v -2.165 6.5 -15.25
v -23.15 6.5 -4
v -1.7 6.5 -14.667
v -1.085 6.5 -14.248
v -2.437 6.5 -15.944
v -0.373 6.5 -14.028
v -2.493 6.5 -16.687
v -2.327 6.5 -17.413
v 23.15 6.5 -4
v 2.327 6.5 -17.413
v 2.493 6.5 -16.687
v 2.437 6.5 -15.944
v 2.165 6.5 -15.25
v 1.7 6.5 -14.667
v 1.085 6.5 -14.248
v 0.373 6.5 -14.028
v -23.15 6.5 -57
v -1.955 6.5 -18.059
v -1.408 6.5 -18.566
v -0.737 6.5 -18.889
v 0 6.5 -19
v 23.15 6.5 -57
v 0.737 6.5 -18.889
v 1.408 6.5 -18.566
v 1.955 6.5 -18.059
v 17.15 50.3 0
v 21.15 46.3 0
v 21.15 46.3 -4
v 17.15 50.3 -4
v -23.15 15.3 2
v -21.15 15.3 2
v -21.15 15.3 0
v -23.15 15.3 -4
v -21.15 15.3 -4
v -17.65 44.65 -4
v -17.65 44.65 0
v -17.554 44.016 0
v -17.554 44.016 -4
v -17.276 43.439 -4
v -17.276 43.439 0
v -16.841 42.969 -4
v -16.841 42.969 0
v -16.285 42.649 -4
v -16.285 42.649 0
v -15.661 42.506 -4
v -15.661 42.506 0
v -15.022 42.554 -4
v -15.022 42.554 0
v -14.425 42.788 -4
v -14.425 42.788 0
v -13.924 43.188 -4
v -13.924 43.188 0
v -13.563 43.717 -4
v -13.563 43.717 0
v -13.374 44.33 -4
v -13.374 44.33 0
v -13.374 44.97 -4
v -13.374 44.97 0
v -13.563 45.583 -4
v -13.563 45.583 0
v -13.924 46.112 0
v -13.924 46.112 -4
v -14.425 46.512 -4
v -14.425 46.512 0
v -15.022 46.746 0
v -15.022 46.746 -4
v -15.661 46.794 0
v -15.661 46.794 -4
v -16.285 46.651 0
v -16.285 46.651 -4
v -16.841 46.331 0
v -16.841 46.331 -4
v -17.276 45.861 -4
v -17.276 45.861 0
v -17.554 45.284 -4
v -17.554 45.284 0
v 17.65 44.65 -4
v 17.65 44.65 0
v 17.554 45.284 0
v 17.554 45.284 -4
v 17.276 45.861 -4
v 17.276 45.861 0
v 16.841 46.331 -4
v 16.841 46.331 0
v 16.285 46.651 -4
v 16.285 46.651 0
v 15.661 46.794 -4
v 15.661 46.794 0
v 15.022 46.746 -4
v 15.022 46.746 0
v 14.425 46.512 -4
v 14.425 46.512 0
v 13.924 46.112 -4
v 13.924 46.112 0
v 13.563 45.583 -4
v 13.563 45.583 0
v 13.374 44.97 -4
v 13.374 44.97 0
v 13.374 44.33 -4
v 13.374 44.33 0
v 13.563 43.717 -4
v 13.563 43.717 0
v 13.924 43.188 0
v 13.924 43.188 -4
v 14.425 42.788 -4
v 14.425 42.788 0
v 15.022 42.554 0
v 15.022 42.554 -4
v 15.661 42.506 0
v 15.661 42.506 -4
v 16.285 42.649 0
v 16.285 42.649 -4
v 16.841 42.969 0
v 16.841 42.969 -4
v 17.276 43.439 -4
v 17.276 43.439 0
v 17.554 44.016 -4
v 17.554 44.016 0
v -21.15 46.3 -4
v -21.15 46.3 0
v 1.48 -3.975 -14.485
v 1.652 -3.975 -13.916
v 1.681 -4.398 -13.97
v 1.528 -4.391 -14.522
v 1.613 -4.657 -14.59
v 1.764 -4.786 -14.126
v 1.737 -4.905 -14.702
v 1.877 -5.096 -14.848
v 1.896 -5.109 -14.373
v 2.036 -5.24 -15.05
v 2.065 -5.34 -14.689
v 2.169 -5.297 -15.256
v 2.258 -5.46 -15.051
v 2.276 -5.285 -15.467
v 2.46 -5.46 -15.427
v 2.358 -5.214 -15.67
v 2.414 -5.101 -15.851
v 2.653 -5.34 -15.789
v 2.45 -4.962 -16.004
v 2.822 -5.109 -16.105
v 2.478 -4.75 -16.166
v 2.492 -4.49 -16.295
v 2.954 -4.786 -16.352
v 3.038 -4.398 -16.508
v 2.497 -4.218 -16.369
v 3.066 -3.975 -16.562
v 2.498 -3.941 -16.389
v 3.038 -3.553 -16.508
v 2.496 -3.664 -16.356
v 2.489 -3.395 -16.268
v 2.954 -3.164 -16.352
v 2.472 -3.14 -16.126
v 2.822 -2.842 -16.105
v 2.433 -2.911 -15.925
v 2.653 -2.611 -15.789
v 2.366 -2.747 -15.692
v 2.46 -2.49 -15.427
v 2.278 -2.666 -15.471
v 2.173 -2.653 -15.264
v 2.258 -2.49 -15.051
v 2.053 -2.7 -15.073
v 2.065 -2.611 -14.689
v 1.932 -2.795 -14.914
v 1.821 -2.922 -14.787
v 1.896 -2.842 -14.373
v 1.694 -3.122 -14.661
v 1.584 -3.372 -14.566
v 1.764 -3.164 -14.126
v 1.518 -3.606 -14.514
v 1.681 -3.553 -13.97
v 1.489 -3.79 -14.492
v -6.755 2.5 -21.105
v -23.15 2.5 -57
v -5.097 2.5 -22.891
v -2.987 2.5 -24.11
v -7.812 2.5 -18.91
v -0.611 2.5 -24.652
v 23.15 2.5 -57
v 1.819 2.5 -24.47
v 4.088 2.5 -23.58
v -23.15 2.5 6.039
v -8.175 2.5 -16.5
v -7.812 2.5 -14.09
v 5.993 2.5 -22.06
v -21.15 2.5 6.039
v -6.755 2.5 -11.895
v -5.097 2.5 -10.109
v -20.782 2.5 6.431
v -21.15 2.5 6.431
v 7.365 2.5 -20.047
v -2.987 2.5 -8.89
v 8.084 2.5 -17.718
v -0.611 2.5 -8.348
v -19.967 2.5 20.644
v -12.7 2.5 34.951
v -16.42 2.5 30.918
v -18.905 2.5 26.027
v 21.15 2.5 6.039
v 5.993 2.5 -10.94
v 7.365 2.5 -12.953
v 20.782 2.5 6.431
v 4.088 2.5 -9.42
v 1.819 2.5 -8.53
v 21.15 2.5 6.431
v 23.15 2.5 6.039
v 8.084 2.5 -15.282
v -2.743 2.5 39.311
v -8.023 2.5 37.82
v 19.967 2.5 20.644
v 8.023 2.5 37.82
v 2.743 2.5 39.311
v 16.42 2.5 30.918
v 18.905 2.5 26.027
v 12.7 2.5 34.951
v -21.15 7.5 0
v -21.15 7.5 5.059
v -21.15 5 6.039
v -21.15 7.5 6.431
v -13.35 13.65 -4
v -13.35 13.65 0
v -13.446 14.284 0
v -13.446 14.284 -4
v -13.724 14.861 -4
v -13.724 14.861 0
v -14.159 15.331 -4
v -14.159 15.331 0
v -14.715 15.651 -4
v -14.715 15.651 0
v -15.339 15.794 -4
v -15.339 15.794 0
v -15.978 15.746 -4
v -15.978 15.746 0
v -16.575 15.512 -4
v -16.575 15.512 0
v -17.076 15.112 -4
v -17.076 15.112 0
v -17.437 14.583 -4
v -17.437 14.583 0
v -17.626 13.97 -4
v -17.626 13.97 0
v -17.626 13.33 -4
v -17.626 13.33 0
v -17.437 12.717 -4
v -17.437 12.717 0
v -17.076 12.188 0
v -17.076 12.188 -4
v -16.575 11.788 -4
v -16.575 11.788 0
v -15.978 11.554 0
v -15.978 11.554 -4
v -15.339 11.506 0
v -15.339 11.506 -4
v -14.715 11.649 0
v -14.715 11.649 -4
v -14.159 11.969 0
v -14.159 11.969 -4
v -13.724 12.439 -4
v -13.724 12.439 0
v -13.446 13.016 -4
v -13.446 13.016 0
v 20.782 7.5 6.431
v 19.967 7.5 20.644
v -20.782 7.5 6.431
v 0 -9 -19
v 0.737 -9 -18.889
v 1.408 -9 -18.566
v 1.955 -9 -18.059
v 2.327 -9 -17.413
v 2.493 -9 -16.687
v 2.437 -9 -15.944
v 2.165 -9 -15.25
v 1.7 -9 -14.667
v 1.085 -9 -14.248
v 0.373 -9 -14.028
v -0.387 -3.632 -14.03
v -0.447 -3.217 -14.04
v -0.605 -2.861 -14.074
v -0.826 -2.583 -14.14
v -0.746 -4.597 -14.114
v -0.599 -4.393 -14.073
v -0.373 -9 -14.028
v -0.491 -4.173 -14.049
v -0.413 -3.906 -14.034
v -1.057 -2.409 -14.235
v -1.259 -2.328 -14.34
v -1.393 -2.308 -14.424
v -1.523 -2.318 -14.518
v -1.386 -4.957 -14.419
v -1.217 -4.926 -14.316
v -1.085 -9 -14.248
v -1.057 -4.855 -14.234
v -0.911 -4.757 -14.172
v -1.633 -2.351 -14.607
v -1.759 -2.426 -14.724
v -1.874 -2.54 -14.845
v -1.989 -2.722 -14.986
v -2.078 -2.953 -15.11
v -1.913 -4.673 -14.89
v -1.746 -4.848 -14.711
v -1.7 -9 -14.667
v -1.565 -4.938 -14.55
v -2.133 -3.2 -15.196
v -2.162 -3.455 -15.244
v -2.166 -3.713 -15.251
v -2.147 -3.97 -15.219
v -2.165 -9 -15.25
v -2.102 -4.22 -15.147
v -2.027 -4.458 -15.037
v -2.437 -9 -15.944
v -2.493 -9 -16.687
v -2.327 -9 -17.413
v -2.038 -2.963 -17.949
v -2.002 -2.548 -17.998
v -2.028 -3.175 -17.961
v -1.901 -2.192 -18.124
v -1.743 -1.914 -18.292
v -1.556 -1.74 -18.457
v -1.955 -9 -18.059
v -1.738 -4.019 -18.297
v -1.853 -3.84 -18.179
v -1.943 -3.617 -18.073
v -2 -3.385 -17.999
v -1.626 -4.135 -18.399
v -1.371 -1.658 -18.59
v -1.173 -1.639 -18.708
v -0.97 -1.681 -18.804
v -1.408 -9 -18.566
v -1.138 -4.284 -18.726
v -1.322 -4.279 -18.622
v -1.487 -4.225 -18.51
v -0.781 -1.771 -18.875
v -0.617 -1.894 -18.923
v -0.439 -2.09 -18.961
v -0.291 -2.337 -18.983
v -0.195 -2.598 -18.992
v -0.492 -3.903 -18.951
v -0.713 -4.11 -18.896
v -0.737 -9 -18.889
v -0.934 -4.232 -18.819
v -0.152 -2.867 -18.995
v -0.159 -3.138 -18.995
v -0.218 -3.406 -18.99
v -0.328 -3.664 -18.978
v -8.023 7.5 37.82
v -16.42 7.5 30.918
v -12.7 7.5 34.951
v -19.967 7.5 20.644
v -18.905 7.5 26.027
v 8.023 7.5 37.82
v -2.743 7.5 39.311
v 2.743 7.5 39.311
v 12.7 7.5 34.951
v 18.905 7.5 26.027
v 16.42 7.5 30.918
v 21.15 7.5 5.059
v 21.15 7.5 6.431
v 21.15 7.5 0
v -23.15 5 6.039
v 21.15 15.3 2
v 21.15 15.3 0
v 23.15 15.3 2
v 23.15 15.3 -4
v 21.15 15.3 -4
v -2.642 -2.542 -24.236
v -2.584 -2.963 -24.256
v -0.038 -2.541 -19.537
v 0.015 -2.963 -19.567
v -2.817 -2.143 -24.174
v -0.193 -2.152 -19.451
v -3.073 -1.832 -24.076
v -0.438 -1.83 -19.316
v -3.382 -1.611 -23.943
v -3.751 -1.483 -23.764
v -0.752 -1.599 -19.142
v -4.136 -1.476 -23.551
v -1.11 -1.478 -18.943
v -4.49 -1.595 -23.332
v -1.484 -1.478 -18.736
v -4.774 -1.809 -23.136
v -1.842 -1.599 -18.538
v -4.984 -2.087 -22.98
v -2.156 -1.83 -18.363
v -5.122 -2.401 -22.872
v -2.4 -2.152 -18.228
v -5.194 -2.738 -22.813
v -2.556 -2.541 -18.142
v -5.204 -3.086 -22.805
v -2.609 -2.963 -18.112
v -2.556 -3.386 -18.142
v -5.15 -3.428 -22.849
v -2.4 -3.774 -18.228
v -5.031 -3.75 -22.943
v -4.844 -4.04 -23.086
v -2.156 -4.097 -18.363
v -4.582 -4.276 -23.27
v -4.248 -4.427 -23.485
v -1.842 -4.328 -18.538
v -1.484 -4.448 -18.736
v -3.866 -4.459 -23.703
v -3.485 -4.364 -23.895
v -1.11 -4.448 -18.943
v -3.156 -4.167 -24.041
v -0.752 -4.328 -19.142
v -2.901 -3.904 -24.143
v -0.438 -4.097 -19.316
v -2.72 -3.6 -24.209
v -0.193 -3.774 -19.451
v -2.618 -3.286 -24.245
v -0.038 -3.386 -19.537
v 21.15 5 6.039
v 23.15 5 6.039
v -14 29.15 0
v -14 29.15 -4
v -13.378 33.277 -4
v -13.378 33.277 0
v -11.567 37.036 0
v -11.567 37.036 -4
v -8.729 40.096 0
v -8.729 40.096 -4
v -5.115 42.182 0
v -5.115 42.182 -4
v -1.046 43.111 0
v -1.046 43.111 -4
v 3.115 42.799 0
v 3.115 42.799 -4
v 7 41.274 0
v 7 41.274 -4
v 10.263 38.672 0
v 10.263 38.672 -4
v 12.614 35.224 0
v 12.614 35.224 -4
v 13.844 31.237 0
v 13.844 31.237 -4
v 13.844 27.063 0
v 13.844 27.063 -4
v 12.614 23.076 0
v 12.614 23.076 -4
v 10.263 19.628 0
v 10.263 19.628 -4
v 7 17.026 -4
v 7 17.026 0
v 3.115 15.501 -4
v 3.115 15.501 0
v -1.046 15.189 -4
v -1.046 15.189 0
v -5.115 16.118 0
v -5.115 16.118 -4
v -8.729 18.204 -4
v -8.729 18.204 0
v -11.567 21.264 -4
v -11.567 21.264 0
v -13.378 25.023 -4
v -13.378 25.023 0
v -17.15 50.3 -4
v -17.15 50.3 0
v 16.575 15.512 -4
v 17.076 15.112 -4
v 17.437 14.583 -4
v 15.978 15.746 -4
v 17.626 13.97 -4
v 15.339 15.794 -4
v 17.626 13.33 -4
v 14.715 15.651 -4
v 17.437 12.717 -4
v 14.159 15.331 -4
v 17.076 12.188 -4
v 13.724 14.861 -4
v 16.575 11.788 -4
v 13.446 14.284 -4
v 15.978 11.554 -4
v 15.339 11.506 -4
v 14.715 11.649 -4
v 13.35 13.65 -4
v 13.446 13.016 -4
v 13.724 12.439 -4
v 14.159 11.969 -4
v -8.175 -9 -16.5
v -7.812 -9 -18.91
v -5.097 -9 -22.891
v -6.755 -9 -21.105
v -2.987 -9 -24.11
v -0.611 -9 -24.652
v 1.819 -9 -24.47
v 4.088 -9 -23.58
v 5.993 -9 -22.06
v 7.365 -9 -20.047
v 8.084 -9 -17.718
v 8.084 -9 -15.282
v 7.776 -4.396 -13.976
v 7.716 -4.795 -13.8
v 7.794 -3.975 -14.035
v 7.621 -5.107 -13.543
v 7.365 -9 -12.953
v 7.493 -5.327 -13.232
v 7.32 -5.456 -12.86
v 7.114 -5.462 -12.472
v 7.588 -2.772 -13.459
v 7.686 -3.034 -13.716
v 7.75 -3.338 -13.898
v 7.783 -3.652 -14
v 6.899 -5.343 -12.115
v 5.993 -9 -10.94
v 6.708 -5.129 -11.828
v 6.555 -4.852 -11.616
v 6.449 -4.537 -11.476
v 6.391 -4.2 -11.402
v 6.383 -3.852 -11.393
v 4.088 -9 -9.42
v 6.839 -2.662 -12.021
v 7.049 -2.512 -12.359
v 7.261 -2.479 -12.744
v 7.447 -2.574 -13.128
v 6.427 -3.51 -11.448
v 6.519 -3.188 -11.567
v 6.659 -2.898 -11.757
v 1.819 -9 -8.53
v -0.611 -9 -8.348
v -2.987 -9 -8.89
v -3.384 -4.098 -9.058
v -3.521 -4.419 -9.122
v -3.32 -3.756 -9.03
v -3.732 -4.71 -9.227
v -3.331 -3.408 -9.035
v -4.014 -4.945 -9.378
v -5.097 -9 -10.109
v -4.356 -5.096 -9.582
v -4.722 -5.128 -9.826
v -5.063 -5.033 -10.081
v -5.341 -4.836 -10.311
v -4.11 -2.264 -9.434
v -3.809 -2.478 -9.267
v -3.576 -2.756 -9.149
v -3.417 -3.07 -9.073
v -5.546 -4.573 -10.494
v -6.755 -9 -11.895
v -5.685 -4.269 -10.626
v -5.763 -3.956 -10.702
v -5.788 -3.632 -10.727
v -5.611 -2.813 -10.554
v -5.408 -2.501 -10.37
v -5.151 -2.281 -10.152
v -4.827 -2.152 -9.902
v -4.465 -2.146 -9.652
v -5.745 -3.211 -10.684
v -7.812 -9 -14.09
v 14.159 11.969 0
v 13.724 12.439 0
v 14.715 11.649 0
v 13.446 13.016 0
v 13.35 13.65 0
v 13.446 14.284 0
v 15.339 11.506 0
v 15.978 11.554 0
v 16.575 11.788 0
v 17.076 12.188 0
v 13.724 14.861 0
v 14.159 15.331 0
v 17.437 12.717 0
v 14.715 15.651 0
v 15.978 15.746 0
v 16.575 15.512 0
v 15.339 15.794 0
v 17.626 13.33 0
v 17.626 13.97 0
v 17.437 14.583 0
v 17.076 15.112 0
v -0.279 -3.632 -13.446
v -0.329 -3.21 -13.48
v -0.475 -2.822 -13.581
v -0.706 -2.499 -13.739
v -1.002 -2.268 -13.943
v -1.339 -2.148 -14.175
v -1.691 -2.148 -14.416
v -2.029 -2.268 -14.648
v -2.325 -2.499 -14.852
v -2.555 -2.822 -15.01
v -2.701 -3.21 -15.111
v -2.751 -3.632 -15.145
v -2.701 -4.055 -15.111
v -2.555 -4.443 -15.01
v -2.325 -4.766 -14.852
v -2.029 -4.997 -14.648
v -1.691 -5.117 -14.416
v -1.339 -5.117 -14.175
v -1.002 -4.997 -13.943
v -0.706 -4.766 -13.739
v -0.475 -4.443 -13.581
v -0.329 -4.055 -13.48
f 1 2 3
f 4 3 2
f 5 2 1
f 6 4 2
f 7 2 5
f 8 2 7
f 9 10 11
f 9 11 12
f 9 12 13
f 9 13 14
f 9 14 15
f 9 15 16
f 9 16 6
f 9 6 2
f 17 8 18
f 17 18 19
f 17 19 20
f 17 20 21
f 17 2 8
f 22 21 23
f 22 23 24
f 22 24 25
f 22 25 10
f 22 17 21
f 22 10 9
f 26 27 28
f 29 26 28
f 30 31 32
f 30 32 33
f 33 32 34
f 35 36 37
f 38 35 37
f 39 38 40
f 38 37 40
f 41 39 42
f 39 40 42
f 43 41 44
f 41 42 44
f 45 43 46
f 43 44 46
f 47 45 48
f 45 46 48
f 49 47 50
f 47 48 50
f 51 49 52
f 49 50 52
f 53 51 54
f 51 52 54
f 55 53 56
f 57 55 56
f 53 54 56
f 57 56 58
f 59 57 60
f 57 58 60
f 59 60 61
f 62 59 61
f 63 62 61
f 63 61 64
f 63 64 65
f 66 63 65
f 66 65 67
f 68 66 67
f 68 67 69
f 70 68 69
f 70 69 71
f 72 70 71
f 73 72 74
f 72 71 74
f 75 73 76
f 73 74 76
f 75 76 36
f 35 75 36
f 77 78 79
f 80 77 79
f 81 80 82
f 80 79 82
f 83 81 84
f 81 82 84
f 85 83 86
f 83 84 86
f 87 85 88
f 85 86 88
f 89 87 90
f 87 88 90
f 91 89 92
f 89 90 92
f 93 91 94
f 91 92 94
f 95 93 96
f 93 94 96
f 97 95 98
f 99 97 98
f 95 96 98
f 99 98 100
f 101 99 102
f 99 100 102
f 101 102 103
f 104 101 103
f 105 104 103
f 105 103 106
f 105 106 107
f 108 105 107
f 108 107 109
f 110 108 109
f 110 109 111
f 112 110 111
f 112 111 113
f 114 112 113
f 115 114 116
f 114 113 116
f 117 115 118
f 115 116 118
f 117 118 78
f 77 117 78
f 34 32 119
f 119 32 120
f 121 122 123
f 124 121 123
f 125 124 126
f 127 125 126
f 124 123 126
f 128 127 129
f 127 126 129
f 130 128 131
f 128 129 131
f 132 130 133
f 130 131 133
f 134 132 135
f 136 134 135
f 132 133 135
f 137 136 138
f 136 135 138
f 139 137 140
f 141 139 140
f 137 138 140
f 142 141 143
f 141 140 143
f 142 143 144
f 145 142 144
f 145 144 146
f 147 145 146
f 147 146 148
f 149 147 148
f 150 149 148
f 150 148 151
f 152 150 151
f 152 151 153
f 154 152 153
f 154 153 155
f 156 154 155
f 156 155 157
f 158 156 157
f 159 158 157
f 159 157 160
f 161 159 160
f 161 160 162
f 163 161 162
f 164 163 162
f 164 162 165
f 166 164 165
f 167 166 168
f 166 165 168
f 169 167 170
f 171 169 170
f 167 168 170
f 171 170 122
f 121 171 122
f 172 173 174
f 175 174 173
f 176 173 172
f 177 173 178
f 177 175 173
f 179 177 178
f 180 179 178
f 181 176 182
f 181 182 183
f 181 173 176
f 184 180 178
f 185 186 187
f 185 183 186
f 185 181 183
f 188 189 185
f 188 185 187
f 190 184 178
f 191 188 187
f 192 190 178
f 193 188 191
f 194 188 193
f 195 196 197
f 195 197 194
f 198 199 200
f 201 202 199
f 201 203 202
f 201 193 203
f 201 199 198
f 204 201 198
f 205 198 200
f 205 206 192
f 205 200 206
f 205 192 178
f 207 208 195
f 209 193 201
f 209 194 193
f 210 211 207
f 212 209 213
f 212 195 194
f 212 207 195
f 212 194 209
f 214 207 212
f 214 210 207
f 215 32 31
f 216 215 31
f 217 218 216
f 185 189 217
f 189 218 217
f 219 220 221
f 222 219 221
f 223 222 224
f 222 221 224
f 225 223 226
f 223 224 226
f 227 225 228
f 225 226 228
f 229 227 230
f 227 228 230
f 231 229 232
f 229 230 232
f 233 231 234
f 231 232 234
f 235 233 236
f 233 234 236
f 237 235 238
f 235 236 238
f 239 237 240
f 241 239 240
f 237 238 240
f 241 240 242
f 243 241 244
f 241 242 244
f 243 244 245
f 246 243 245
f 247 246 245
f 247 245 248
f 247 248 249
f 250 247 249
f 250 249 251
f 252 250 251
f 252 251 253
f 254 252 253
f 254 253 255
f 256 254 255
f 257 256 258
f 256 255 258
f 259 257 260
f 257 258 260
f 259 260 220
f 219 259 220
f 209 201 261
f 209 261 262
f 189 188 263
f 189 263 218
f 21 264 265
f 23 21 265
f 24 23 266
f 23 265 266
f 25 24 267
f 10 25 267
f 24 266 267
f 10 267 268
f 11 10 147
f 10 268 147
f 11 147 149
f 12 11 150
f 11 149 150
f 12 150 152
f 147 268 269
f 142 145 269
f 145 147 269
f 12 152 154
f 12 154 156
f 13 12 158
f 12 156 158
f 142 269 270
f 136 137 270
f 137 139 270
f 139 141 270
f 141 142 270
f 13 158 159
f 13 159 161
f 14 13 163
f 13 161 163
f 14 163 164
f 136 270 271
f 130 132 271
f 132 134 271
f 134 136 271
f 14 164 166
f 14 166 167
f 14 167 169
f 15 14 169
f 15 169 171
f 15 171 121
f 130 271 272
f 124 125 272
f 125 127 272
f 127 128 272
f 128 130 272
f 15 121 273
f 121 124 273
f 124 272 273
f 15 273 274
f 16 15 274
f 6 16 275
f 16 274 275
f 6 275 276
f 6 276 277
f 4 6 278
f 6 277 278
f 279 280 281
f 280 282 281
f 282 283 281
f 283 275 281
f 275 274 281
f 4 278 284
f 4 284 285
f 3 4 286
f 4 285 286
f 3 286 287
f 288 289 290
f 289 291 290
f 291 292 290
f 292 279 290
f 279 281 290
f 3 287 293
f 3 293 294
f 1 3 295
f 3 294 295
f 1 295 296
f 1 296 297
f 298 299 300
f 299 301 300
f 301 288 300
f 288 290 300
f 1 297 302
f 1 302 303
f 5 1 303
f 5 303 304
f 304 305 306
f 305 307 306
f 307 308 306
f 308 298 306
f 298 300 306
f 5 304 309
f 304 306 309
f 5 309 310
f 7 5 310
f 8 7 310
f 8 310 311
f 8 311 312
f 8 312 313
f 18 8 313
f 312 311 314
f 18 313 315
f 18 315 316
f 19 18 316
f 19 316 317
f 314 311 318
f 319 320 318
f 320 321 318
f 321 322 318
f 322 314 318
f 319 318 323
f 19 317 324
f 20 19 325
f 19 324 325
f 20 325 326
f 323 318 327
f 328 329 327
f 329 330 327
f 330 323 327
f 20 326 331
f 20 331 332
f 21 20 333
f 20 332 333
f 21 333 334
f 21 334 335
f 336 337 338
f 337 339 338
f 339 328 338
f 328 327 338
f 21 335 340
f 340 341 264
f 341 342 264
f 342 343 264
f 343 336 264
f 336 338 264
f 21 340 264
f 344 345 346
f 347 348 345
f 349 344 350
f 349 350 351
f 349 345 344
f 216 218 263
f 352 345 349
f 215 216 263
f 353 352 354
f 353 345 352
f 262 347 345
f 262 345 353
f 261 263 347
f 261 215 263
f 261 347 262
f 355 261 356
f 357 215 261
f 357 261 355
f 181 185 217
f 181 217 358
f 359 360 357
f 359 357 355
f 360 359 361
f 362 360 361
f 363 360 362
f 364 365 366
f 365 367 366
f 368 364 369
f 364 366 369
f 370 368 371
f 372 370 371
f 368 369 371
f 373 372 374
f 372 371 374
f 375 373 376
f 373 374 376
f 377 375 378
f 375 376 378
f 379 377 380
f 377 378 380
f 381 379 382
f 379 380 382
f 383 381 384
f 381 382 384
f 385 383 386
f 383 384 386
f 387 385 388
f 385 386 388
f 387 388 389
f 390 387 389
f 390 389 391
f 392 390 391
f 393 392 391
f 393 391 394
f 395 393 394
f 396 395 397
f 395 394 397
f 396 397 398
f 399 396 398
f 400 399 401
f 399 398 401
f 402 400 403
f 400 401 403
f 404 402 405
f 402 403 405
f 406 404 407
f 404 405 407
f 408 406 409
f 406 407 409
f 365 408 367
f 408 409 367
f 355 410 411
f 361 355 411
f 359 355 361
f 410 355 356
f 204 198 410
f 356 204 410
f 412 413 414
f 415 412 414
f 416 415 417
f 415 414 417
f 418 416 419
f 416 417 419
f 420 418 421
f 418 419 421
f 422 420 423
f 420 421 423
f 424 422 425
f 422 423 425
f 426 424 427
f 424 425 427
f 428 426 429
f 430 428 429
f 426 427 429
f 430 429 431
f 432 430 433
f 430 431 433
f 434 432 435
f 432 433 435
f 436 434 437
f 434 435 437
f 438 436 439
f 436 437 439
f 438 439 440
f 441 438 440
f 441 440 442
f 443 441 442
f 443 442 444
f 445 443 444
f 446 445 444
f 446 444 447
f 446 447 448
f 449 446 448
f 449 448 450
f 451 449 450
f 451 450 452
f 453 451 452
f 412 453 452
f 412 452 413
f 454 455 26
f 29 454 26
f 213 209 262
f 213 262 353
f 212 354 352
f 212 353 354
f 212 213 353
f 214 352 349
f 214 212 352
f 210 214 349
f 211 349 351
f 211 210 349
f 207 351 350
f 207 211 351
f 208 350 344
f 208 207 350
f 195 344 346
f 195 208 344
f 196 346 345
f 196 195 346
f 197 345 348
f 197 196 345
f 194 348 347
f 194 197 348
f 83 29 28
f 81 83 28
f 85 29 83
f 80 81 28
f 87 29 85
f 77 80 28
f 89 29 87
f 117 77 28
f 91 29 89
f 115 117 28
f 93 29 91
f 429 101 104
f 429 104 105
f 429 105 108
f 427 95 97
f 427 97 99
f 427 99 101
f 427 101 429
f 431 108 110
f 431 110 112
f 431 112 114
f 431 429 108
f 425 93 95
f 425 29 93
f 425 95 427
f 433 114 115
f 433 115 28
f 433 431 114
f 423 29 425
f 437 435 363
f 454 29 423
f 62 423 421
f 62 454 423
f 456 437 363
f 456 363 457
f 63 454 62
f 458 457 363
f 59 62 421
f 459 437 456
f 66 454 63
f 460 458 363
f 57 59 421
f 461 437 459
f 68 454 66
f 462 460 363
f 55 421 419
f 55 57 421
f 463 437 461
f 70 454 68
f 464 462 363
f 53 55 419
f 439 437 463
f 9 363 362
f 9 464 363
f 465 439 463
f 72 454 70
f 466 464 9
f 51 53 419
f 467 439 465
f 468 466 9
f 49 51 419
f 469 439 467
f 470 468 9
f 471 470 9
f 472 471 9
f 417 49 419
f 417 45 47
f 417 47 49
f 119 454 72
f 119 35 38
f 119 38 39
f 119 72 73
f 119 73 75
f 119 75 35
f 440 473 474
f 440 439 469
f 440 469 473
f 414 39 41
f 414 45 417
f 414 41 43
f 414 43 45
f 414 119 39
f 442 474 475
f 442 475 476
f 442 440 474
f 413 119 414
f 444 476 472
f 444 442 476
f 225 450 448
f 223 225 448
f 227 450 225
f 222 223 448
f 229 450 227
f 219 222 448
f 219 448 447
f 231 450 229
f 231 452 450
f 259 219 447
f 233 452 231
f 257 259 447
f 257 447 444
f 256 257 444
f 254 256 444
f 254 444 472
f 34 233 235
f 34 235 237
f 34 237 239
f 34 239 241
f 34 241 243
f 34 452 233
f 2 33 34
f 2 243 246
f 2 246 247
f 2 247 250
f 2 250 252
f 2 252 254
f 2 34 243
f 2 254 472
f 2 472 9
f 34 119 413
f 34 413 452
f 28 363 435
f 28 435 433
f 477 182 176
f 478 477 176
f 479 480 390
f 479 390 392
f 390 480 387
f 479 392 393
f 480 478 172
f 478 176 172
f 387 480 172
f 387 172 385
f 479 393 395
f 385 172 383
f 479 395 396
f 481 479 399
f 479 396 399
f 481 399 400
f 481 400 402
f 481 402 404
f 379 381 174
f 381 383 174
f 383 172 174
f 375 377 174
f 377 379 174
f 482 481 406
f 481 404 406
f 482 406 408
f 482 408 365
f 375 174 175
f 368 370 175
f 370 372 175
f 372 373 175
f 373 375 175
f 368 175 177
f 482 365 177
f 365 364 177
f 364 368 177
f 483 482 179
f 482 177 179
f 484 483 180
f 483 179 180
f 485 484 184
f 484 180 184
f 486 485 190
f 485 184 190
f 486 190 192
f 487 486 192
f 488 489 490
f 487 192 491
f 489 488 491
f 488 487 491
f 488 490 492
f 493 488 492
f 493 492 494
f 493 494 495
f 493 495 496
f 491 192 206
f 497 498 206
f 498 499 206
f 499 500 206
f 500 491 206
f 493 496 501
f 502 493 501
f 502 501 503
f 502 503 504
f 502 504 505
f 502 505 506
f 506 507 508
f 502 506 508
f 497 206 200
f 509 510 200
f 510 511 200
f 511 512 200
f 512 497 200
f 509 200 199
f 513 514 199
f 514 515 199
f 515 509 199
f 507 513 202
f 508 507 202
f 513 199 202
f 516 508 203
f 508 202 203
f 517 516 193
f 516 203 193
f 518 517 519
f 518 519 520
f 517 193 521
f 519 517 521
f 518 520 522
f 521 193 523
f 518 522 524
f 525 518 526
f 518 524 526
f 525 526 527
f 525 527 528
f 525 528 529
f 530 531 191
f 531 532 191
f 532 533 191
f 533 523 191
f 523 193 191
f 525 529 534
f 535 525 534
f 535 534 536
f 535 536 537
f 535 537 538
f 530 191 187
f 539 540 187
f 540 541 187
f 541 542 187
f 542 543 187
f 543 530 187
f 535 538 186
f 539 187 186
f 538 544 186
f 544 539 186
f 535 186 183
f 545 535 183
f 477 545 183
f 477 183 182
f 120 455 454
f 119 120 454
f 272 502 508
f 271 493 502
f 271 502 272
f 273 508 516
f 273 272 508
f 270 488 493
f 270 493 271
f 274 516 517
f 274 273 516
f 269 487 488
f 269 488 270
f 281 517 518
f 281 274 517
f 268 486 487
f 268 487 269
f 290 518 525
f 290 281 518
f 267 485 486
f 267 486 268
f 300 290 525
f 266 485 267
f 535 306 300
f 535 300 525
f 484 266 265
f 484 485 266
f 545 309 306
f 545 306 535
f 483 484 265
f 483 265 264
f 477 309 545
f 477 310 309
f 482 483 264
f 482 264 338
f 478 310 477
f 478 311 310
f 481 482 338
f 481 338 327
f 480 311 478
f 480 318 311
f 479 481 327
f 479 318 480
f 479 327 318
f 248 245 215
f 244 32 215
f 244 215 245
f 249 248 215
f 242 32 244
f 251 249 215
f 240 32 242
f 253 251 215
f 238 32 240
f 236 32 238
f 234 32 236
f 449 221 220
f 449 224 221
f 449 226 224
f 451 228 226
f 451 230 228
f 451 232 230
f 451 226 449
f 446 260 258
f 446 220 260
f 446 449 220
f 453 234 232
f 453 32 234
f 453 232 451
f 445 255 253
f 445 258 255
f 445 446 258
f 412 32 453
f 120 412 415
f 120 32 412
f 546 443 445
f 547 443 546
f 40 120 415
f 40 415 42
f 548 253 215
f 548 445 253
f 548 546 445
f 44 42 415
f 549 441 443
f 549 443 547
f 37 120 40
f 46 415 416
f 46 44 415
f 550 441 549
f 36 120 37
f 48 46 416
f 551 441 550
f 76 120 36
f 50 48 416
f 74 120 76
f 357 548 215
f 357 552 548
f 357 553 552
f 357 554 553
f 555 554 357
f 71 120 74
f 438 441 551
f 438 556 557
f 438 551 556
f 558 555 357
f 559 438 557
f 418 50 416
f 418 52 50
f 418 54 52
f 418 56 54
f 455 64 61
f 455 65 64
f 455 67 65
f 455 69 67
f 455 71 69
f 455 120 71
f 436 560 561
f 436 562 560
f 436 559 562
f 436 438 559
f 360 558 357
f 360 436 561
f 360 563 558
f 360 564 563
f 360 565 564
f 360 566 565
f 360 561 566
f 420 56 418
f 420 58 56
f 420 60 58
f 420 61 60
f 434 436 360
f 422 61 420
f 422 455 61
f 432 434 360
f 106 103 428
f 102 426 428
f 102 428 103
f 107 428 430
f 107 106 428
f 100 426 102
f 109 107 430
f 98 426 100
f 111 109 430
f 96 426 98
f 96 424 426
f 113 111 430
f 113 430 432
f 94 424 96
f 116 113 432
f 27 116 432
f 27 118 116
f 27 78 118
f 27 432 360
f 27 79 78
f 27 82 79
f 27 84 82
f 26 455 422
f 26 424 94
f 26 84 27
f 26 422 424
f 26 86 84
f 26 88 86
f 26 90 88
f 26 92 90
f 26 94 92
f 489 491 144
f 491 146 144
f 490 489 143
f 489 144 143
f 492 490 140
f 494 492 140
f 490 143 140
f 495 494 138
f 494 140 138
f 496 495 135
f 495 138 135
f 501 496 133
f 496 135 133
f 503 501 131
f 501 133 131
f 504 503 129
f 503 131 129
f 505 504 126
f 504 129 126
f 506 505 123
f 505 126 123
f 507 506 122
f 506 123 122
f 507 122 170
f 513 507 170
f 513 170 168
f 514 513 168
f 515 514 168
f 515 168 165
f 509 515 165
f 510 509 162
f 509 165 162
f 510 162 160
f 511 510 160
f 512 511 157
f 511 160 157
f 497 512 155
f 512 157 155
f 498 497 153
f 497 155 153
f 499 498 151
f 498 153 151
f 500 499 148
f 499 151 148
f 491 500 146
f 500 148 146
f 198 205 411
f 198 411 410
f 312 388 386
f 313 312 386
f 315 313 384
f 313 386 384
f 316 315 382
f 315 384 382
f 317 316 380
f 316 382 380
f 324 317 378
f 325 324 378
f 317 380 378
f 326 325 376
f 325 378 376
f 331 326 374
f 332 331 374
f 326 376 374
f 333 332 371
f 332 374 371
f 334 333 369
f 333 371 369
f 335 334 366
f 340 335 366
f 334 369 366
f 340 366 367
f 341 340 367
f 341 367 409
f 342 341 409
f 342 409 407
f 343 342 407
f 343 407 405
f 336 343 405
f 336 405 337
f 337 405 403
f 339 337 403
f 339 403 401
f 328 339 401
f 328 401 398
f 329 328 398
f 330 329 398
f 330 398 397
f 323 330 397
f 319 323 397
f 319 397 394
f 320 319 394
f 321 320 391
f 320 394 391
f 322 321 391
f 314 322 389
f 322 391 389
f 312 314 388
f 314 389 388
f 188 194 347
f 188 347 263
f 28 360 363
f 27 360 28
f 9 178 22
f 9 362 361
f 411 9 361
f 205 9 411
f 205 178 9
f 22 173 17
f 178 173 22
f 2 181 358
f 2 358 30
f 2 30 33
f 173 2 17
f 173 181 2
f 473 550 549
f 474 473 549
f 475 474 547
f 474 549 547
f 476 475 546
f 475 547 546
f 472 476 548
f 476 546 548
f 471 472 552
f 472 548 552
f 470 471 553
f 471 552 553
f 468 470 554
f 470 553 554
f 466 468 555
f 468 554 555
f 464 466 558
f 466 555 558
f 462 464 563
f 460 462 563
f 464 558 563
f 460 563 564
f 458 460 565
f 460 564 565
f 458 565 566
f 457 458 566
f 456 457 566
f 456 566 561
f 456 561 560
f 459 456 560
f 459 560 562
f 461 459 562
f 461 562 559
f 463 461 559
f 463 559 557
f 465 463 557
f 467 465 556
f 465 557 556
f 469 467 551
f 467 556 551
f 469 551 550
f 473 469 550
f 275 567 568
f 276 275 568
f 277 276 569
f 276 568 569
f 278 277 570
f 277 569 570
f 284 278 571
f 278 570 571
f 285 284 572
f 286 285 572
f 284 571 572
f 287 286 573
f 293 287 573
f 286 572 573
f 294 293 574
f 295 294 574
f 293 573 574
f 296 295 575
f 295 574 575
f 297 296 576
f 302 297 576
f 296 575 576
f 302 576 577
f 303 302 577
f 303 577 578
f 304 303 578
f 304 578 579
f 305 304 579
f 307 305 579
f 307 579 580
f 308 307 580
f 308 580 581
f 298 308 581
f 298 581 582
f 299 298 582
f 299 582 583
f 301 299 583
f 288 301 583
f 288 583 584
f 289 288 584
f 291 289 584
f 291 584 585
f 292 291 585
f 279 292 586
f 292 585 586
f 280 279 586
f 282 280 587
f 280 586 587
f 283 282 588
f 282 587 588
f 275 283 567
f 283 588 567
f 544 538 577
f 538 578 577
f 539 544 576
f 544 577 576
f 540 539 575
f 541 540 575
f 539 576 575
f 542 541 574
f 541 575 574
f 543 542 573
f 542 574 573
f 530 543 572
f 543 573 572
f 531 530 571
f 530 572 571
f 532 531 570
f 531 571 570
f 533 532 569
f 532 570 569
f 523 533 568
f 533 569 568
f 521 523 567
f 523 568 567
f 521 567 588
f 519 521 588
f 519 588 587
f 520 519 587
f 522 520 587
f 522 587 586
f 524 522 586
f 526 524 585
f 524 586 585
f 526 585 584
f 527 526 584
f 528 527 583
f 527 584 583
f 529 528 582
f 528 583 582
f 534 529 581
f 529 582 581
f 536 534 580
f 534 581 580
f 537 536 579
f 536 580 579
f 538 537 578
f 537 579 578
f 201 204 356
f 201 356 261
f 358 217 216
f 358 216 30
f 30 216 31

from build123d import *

# Parameters (mm, degrees)
SKETCH_5_W                = 42.3
SKETCH_5_H                = 50.3
SKETCH_5_R                = 11.15
SKETCH_5_R_2              = 2.15
EXTRUDE_2_DEPTH           = 4
EXTRUDE_3_DEPTH           = 4
SKETCH_7_R                = 1.7
CUT_EXTRUDE_3_DEPTH       = 4
CHAMFER_1_SIZE            = 4
EXTRUDE_4_DEPTH           = 2
EXTRUDE_5_REACH           = 79.8
EXTRUDE_6_REACH           = 80.956
SKETCH_12_W               = 46.3
SKETCH_12_H               = 3
EXTRUDE_7_DEPTH           = 53
EXTRUDE_9_DEPTH           = 4
CUT_EXTRUDE_4_DEPTH       = 5
SKETCH_17_R               = 5.175
EXTRUDE_10_DEPTH          = 15
SKETCH_18_R               = 1.6
CUT_EXTRUDE_6_DEPTH       = 15
F_2_0MM_1_D               = 3.1
F_2_0MM_1_DEPTH           = 4.45
F_2_0MM_1_TIP             = 1.55
F_2_0MM_1_ON_FACE_2_D     = 3.1
F_2_0MM_1_ON_FACE_2_DEPTH = 4.45
F_2_0MM_1_ON_FACE_2_TIP   = 1.55
F_2_0MM_1_ON_FACE_3_D     = 3.1
F_2_0MM_1_ON_FACE_3_DEPTH = 4.45
F_2_0MM_1_ON_FACE_3_TIP   = 1.55
SKETCH_21_W               = 46.3
SKETCH_21_H               = 53
CUT_EXTRUDE_7_DEPTH       = 1.5
CUT_EXTRUDE_START         = -0.5
CUT_EXTRUDE_8_DEPTH       = 0.5
EXTRUDE_START             = 2.5
EXTRUDE_11_DEPTH          = 2.5
SKETCH_25_R               = 2.55
CUT_EXTRUDE_9_DEPTH       = 15
SKETCH_28_R               = 5.175
EXTRUDE_13_DEPTH          = 3.5
EXTRUDE_START_2           = -17
SKETCH_30_R               = 5.175
EXTRUDE_15_DEPTH          = 17
SKETCH_31_R               = 8.175
EXTRUDE_16_DEPTH          = 13
SKETCH_32_R               = 2.5
CUT_EXTRUDE_10_DEPTH      = 18
CUT_EXTRUDE_START_2       = -1.5
SKETCH_33_R               = 8.175
CUT_EXTRUDE_11_DEPTH      = 1.5
F_3_0MM_1_D               = 3
F_3_0MM_1_DEPTH           = 5.5
F_3_0MM_1_TIP             = 1.5
F_3_0MM_1_ON_FACE_2_D     = 3
F_3_0MM_1_ON_FACE_2_DEPTH = 5.5
F_3_0MM_1_ON_FACE_2_TIP   = 1.5
F_3_0MM_1_ON_FACE_3_D     = 3
F_3_0MM_1_ON_FACE_3_DEPTH = 5.5
F_3_0MM_1_ON_FACE_3_TIP   = 1.5
SKETCH_36_R               = 14
CUT_EXTRUDE_12_DEPTH      = 5


with BuildPart() as part:
    # Sketch 5 → Extrude 2 (new body)
    with BuildSketch(Plane.XY):
        with Locations((0, 25.15)):
            Rectangle(SKETCH_5_W, SKETCH_5_H)
        with Locations((0, 29.15)):
            Circle(SKETCH_5_R, mode=Mode.SUBTRACT)
        with Locations((15.5, 44.65)):
            Circle(SKETCH_5_R_2, mode=Mode.SUBTRACT)
        with Locations(Location((15.5, 13.65, 0), (0, 0, 180))):
            Circle(SKETCH_5_R_2, mode=Mode.SUBTRACT)
        with Locations((-15.5, 13.65)):
            Circle(SKETCH_5_R_2, mode=Mode.SUBTRACT)
        with Locations(Location((-15.5, 44.65, 0), (0, 0, 180))):
            Circle(SKETCH_5_R_2, mode=Mode.SUBTRACT)
    extrude(amount=-EXTRUDE_2_DEPTH)

    # Sketch 6 → Extrude 3 (add)
    with BuildSketch(Plane.XZ):
        with BuildLine():
            Line((-21.15, 0), (-19.967256346, 20.643972909))
            ThreePointArc((-19.967256346, 20.643972909), (0, 39.5), (19.967256346, 20.643972909))
            Line((19.967256346, 20.643972909), (21.15, 0))
            Line((21.15, 0), (-21.15, 0))
        make_face()
    extrude(amount=-EXTRUDE_3_DEPTH)

    # Sketch 7 → Cut-Extrude 3 (cut)
    with BuildSketch(Plane(origin=(0, 4, 0), x_dir=(1, 0, 0), z_dir=(0, 1, 0))):
        with Locations(Location((0, -5.5, 0), (0, 0, 270))):
            Circle(SKETCH_7_R)
        with Locations(Location((12.124355653, -12.5, 0), (0, 0, 270))):
            Circle(SKETCH_7_R)
        with Locations(Location((12.124355653, -26.5, 0), (0, 0, 270))):
            Circle(SKETCH_7_R)
        with Locations(Location((0, -33.5, 0), (0, 0, 270))):
            Circle(SKETCH_7_R)
        with Locations(Location((-12.124355653, -26.5, 0), (0, 0, 270))):
            Circle(SKETCH_7_R)
        with Locations(Location((-12.124355653, -12.5, 0), (0, 0, 270))):
            Circle(SKETCH_7_R)
    extrude(amount=-CUT_EXTRUDE_3_DEPTH, mode=Mode.SUBTRACT)

    # Chamfer 1
    chamfer_1_edges = [part.edges().sort_by_distance(p)[0] for p in [
        (-21.15, 50.3, -2),
        (21.15, 50.3, -2),
    ]]
    chamfer(chamfer_1_edges, length=CHAMFER_1_SIZE)

    # Sketch 9 → Extrude 4 (add)
    with BuildSketch(Plane.ZY.offset(21.15)):
        Polygon((-4, 0), (8, 0), (2, 15.3), (-4, 15.3), align=None)
    extrude_4 = extrude(amount=EXTRUDE_4_DEPTH)

    # Extrude 5: up to this face of the body (flat: up to its plane)
    extrude_5_end = Plane(part.part.faces().sort_by_distance((-20.558628173, 2, 10.321986454))[0])
    # Sketch 10 → Extrude 5 (add, up to the picked face)
    with BuildSketch(Plane.ZY.offset(23.15), mode=Mode.PRIVATE) as extrude_5_sk1:
        Polygon((-4, 0), (8, 0), (6.431372549, 4), (-4, 4), align=None)
    extrude_5_tool1 = split(extrude(extrude_5_sk1.sketch, amount=-EXTRUDE_5_REACH, mode=Mode.PRIVATE), bisect_by=extrude_5_end, keep=Keep.BOTH, mode=Mode.PRIVATE)
    add(extrude_5_tool1.solids().sort_by(Axis((-23.15, 1.95338, 1.616984), (1, 0, 0)))[0])

    # Mirror 2: Extrude 4 across plane
    add(extrude_4.mirror(Plane(origin=(0, 0, 0), x_dir=(0, 0, 1), z_dir=(1, 0, 0))))

    # Extrude 6: up to this face of the body (flat: up to its plane)
    extrude_6_end = Plane(part.part.faces().sort_by_distance((20.558628173, 2, 10.321986454))[0])
    # Sketch 11 → Extrude 6 (add, up to the picked face)
    with BuildSketch(Plane(origin=(23.15, 0, 0), x_dir=(0, 0, -1), z_dir=(1, 0, 0)), mode=Mode.PRIVATE) as extrude_6_sk1:
        Polygon((-6.431372549, 4), (4, 4), (4, 0), (-8, 0), align=None)
    extrude_6_tool1 = split(extrude(extrude_6_sk1.sketch, amount=-EXTRUDE_6_REACH, mode=Mode.PRIVATE), bisect_by=extrude_6_end, keep=Keep.BOTH, mode=Mode.PRIVATE)
    add(extrude_6_tool1.solids().sort_by(Axis((23.15, 1.95338, 1.616984), (-1, 0, 0)))[0])

    # Sketch 12 → Extrude 7 (add)
    with BuildSketch(Plane(origin=(0, 0, -4), x_dir=(-1, 0, 0), z_dir=(0, 0, -1))):
        with Locations((0, 6.5)):
            Rectangle(SKETCH_12_W, SKETCH_12_H)
    extrude(amount=EXTRUDE_7_DEPTH)

    # Sketch 14 → Extrude 9 (add)
    with BuildSketch(Plane(origin=(0, 4, 0), x_dir=(1, 0, 0), z_dir=(0, 1, 0))):
        with BuildLine():
            Line((21.15, 0), (-21.15, 0))
            Line((-21.15, 0), (-21.15, -6.431372549))
            Line((-21.15, -6.431372549), (-20.781530951, -6.431372549))
            Line((-20.781530951, -6.431372549), (-19.967256346, -20.643972909))
            ThreePointArc((-19.967256346, -20.643972909), (0, -39.5), (19.967256346, -20.643972909))
            Line((19.967256346, -20.643972909), (20.781530951, -6.431372549))
            Line((20.781530951, -6.431372549), (21.15, -6.431372549))
            Line((21.15, -6.431372549), (21.15, 0))
        make_face()
    extrude(amount=EXTRUDE_9_DEPTH)

    # Sketch 15 → Cut-Extrude 4 (cut)
    with BuildSketch(Plane.XZ):
        with BuildLine():
            Line((-23.15, -4), (23.15, -4))
            Line((23.15, -4), (23.15, 8))
            Line((23.15, 8), (20.691660451, 8))
            Line((20.691660451, 8), (19.967256346, 20.643972909))
            ThreePointArc((19.967256346, 20.643972909), (0, 39.5), (-19.967256346, 20.643972909))
            Line((-19.967256346, 20.643972909), (-20.691660451, 8))
            Line((-20.691660451, 8), (-23.15, 8))
            Line((-23.15, 8), (-23.15, -4))
        make_face()
    extrude(amount=-CUT_EXTRUDE_4_DEPTH, mode=Mode.SUBTRACT)

    # Sketch 17 → Extrude 10 (add)
    with BuildSketch(Plane(origin=(0, 8, 0), x_dir=(1, 0, 0), z_dir=(0, 1, 0))):
        with Locations(Location((0, 16.5, 0), (0, 0, 270))):
            Circle(SKETCH_17_R)
    extrude(amount=-EXTRUDE_10_DEPTH)

    # Sketch 18 → Cut-Extrude 6 (cut)
    with BuildSketch(Plane.XZ.offset(7)):
        with Locations(Location((0, -16.5, 0), (0, 0, 270))):
            Circle(SKETCH_18_R)
    extrude(amount=-CUT_EXTRUDE_6_DEPTH, mode=Mode.SUBTRACT)

    # 2.0mm _1
    with Locations(Plane(origin=(-2.383959963, -1.470142013, -11.906813753), x_dir=(0.887572221549, 0, 0.46066859187), z_dir=(-0.46066859187, 0, 0.887572221549))):
        with Locations((0, 0)):
            Hole(F_2_0MM_1_D / 2, depth=F_2_0MM_1_DEPTH)
            with Locations((0, 0, -(F_2_0MM_1_DEPTH + F_2_0MM_1_TIP / 2))):  # 90° drill point
                Cone(0, F_2_0MM_1_D / 2, F_2_0MM_1_TIP, mode=Mode.SUBTRACT)

    # 2.0mm _1 on face 2
    with Locations(Plane(origin=(-4.001379199, -1.359919587, -19.781705274), x_dir=(0.634146160856, 0, -0.773213196131), z_dir=(-0.773213196131, 0, -0.634146160856))):
        with Locations((-1e-09, 0)):
            Hole(F_2_0MM_1_ON_FACE_2_D / 2, depth=F_2_0MM_1_ON_FACE_2_DEPTH)
            with Locations((0, 0, -(F_2_0MM_1_ON_FACE_2_DEPTH + F_2_0MM_1_ON_FACE_2_TIP / 2))):  # 90° drill point
                Cone(0, F_2_0MM_1_ON_FACE_2_D / 2, F_2_0MM_1_ON_FACE_2_TIP, mode=Mode.SUBTRACT)

    # 2.0mm _1 on face 3
    with Locations(Plane(origin=(4.74207792, -1.268589172, -18.572033301), x_dir=(0.40039282367, 0, 0.916343596449), z_dir=(0.916343596449, 0, -0.40039282367))):
        with Locations((0, 0)):
            Hole(F_2_0MM_1_ON_FACE_3_D / 2, depth=F_2_0MM_1_ON_FACE_3_DEPTH)
            with Locations((0, 0, -(F_2_0MM_1_ON_FACE_3_DEPTH + F_2_0MM_1_ON_FACE_3_TIP / 2))):  # 90° drill point
                Cone(0, F_2_0MM_1_ON_FACE_3_D / 2, F_2_0MM_1_ON_FACE_3_TIP, mode=Mode.SUBTRACT)

    # Sketch 21 → Cut-Extrude 7 (cut)
    with BuildSketch(Plane(origin=(0, 8, 0), x_dir=(1, 0, 0), z_dir=(0, 1, 0))):
        with Locations((0, 30.5)):
            Rectangle(SKETCH_21_W, SKETCH_21_H)
    extrude(amount=-CUT_EXTRUDE_7_DEPTH, mode=Mode.SUBTRACT)

    # Sketch 22 → Cut-Extrude 8 (cut)
    with BuildSketch(Plane(origin=(0, 8, 0), x_dir=(1, 0, 0), z_dir=(0, 1, 0)).offset(CUT_EXTRUDE_START)):
        with BuildLine():
            Line((21.15, -6.431372549), (21.15, -4.862745098))
            Line((21.15, -4.862745098), (21.15, 0))
            Line((21.15, 0), (-21.15, 0))
            Line((-21.15, 0), (-21.15, -4.862745098))
            Line((-21.15, -4.862745098), (-21.15, -6.431372549))
            Line((-21.15, -6.431372549), (-20.781530951, -6.431372549))
            Line((-20.781530951, -6.431372549), (-19.967256346, -20.643972909))
            ThreePointArc((-19.967256346, -20.643972909), (0, -39.5), (19.967256346, -20.643972909))
            Line((19.967256346, -20.643972909), (20.781530951, -6.431372549))
            Line((20.781530951, -6.431372549), (21.15, -6.431372549))
        make_face()
    extrude(amount=CUT_EXTRUDE_8_DEPTH, mode=Mode.SUBTRACT)

    # Sketch 23 → Extrude 11 (add)
    with BuildSketch(Plane.XZ.offset(-5).offset(EXTRUDE_START)):
        with BuildLine():
            Line((23.15, -57), (23.15, 6.039215686))
            Line((23.15, 6.039215686), (21.15, 6.039215686))
            Line((21.15, 6.039215686), (21.15, 6.431372549))
            Line((21.15, 6.431372549), (20.781530951, 6.431372549))
            Line((20.781530951, 6.431372549), (19.967256346, 20.643972909))
            ThreePointArc((19.967256346, 20.643972909), (0, 39.5), (-19.967256346, 20.643972909))
            Line((-19.967256346, 20.643972909), (-20.781530951, 6.431372549))
            Line((-20.781530951, 6.431372549), (-21.15, 6.431372549))
            Line((-21.15, 6.431372549), (-21.15, 6.039215686))
            Line((-21.15, 6.039215686), (-23.15, 6.039215686))
            Line((-23.15, 6.039215686), (-23.15, -57))
            Line((-23.15, -57), (23.15, -57))
        make_face()
    extrude(amount=-EXTRUDE_11_DEPTH)

    # Sketch 25 → Cut-Extrude 9 (cut)
    with BuildSketch(Plane.XZ.offset(7)):
        with Locations(Location((0, -16.5, 0), (0, 0, 270))):
            Circle(SKETCH_25_R)
    extrude(amount=-CUT_EXTRUDE_9_DEPTH, mode=Mode.SUBTRACT)

    # Sketch 28 → Extrude 13 (add)
    with BuildSketch(Plane.XZ.offset(7)):
        with Locations((0, -16.5)):
            Circle(SKETCH_28_R)
    extrude(amount=EXTRUDE_13_DEPTH)

    # Sketch 30 → Extrude 15 (add)
    with BuildSketch(Plane.XZ.offset(10.5).offset(EXTRUDE_START_2)):
        with Locations((0, -16.5)):
            Circle(SKETCH_30_R)
    extrude(amount=EXTRUDE_15_DEPTH)

    # Sketch 31 → Extrude 16 (add)
    with BuildSketch(Plane.XZ.offset(-2.5)):
        with Locations(Location((0, -16.5, 0), (0, 0, 180))):
            Circle(SKETCH_31_R)
    extrude(amount=EXTRUDE_16_DEPTH)

    # Sketch 32 → Cut-Extrude 10 (cut)
    with BuildSketch(Plane.XZ.offset(10.5)):
        with Locations(Location((0, -16.5, 0), (0, 0, 270))):
            Circle(SKETCH_32_R)
    extrude(amount=-CUT_EXTRUDE_10_DEPTH, mode=Mode.SUBTRACT)

    # Sketch 33 → Cut-Extrude 11 (cut)
    with BuildSketch(Plane.XZ.offset(10.5).offset(CUT_EXTRUDE_START_2)):
        with Locations(Location((0, -16.5, 0), (0, 0, 180))):
            Circle(SKETCH_33_R)
    extrude(amount=CUT_EXTRUDE_11_DEPTH, mode=Mode.SUBTRACT)

    # 3.0mm _1
    with Locations(Plane(origin=(-4.630535501, -3.632499102, -9.762881479), x_dir=(0.824112357357, 0, 0.566426361014), z_dir=(-0.566426361014, 0, 0.824112357357))):
        with Locations((0, 0)):
            Hole(F_3_0MM_1_D / 2, depth=F_3_0MM_1_DEPTH)
            with Locations((0, 0, -(F_3_0MM_1_DEPTH + F_3_0MM_1_TIP / 2))):  # 90° drill point
                Cone(0, F_3_0MM_1_D / 2, F_3_0MM_1_TIP, mode=Mode.SUBTRACT)

    # 3.0mm _1 on face 2
    with Locations(Plane(origin=(-3.963100189, -2.963132752, -23.650137194), x_dir=(-0.874634588785, 0, 0.484782772076), z_dir=(-0.484782772076, 0, -0.874634588785))):
        with Locations((0, 0)):
            Hole(F_3_0MM_1_ON_FACE_2_D / 2, depth=F_3_0MM_1_ON_FACE_2_DEPTH)
            with Locations((0, 0, -(F_3_0MM_1_ON_FACE_2_DEPTH + F_3_0MM_1_ON_FACE_2_TIP / 2))):  # 90° drill point
                Cone(0, F_3_0MM_1_ON_FACE_2_D / 2, F_3_0MM_1_ON_FACE_2_TIP, mode=Mode.SUBTRACT)

    # 3.0mm _1 on face 3
    with Locations(Plane(origin=(7.209647411, -3.975215155, -12.646221437), x_dir=(-0.471410072716, 0, 0.881914136037), z_dir=(0.881914136037, 0, 0.471410072716))):
        with Locations((0, 0)):
            Hole(F_3_0MM_1_ON_FACE_3_D / 2, depth=F_3_0MM_1_ON_FACE_3_DEPTH)
            with Locations((0, 0, -(F_3_0MM_1_ON_FACE_3_DEPTH + F_3_0MM_1_ON_FACE_3_TIP / 2))):  # 90° drill point
                Cone(0, F_3_0MM_1_ON_FACE_3_D / 2, F_3_0MM_1_ON_FACE_3_TIP, mode=Mode.SUBTRACT)

    # Sketch 36 → Cut-Extrude 12 (cut)
    with BuildSketch(Plane(origin=(0, 0, -4), x_dir=(-1, 0, 0), z_dir=(0, 0, -1))):
        with Locations((0, 29.15)):
            Circle(SKETCH_36_R)
    extrude(amount=-CUT_EXTRUDE_12_DEPTH, mode=Mode.SUBTRACT)


solid = part.part
